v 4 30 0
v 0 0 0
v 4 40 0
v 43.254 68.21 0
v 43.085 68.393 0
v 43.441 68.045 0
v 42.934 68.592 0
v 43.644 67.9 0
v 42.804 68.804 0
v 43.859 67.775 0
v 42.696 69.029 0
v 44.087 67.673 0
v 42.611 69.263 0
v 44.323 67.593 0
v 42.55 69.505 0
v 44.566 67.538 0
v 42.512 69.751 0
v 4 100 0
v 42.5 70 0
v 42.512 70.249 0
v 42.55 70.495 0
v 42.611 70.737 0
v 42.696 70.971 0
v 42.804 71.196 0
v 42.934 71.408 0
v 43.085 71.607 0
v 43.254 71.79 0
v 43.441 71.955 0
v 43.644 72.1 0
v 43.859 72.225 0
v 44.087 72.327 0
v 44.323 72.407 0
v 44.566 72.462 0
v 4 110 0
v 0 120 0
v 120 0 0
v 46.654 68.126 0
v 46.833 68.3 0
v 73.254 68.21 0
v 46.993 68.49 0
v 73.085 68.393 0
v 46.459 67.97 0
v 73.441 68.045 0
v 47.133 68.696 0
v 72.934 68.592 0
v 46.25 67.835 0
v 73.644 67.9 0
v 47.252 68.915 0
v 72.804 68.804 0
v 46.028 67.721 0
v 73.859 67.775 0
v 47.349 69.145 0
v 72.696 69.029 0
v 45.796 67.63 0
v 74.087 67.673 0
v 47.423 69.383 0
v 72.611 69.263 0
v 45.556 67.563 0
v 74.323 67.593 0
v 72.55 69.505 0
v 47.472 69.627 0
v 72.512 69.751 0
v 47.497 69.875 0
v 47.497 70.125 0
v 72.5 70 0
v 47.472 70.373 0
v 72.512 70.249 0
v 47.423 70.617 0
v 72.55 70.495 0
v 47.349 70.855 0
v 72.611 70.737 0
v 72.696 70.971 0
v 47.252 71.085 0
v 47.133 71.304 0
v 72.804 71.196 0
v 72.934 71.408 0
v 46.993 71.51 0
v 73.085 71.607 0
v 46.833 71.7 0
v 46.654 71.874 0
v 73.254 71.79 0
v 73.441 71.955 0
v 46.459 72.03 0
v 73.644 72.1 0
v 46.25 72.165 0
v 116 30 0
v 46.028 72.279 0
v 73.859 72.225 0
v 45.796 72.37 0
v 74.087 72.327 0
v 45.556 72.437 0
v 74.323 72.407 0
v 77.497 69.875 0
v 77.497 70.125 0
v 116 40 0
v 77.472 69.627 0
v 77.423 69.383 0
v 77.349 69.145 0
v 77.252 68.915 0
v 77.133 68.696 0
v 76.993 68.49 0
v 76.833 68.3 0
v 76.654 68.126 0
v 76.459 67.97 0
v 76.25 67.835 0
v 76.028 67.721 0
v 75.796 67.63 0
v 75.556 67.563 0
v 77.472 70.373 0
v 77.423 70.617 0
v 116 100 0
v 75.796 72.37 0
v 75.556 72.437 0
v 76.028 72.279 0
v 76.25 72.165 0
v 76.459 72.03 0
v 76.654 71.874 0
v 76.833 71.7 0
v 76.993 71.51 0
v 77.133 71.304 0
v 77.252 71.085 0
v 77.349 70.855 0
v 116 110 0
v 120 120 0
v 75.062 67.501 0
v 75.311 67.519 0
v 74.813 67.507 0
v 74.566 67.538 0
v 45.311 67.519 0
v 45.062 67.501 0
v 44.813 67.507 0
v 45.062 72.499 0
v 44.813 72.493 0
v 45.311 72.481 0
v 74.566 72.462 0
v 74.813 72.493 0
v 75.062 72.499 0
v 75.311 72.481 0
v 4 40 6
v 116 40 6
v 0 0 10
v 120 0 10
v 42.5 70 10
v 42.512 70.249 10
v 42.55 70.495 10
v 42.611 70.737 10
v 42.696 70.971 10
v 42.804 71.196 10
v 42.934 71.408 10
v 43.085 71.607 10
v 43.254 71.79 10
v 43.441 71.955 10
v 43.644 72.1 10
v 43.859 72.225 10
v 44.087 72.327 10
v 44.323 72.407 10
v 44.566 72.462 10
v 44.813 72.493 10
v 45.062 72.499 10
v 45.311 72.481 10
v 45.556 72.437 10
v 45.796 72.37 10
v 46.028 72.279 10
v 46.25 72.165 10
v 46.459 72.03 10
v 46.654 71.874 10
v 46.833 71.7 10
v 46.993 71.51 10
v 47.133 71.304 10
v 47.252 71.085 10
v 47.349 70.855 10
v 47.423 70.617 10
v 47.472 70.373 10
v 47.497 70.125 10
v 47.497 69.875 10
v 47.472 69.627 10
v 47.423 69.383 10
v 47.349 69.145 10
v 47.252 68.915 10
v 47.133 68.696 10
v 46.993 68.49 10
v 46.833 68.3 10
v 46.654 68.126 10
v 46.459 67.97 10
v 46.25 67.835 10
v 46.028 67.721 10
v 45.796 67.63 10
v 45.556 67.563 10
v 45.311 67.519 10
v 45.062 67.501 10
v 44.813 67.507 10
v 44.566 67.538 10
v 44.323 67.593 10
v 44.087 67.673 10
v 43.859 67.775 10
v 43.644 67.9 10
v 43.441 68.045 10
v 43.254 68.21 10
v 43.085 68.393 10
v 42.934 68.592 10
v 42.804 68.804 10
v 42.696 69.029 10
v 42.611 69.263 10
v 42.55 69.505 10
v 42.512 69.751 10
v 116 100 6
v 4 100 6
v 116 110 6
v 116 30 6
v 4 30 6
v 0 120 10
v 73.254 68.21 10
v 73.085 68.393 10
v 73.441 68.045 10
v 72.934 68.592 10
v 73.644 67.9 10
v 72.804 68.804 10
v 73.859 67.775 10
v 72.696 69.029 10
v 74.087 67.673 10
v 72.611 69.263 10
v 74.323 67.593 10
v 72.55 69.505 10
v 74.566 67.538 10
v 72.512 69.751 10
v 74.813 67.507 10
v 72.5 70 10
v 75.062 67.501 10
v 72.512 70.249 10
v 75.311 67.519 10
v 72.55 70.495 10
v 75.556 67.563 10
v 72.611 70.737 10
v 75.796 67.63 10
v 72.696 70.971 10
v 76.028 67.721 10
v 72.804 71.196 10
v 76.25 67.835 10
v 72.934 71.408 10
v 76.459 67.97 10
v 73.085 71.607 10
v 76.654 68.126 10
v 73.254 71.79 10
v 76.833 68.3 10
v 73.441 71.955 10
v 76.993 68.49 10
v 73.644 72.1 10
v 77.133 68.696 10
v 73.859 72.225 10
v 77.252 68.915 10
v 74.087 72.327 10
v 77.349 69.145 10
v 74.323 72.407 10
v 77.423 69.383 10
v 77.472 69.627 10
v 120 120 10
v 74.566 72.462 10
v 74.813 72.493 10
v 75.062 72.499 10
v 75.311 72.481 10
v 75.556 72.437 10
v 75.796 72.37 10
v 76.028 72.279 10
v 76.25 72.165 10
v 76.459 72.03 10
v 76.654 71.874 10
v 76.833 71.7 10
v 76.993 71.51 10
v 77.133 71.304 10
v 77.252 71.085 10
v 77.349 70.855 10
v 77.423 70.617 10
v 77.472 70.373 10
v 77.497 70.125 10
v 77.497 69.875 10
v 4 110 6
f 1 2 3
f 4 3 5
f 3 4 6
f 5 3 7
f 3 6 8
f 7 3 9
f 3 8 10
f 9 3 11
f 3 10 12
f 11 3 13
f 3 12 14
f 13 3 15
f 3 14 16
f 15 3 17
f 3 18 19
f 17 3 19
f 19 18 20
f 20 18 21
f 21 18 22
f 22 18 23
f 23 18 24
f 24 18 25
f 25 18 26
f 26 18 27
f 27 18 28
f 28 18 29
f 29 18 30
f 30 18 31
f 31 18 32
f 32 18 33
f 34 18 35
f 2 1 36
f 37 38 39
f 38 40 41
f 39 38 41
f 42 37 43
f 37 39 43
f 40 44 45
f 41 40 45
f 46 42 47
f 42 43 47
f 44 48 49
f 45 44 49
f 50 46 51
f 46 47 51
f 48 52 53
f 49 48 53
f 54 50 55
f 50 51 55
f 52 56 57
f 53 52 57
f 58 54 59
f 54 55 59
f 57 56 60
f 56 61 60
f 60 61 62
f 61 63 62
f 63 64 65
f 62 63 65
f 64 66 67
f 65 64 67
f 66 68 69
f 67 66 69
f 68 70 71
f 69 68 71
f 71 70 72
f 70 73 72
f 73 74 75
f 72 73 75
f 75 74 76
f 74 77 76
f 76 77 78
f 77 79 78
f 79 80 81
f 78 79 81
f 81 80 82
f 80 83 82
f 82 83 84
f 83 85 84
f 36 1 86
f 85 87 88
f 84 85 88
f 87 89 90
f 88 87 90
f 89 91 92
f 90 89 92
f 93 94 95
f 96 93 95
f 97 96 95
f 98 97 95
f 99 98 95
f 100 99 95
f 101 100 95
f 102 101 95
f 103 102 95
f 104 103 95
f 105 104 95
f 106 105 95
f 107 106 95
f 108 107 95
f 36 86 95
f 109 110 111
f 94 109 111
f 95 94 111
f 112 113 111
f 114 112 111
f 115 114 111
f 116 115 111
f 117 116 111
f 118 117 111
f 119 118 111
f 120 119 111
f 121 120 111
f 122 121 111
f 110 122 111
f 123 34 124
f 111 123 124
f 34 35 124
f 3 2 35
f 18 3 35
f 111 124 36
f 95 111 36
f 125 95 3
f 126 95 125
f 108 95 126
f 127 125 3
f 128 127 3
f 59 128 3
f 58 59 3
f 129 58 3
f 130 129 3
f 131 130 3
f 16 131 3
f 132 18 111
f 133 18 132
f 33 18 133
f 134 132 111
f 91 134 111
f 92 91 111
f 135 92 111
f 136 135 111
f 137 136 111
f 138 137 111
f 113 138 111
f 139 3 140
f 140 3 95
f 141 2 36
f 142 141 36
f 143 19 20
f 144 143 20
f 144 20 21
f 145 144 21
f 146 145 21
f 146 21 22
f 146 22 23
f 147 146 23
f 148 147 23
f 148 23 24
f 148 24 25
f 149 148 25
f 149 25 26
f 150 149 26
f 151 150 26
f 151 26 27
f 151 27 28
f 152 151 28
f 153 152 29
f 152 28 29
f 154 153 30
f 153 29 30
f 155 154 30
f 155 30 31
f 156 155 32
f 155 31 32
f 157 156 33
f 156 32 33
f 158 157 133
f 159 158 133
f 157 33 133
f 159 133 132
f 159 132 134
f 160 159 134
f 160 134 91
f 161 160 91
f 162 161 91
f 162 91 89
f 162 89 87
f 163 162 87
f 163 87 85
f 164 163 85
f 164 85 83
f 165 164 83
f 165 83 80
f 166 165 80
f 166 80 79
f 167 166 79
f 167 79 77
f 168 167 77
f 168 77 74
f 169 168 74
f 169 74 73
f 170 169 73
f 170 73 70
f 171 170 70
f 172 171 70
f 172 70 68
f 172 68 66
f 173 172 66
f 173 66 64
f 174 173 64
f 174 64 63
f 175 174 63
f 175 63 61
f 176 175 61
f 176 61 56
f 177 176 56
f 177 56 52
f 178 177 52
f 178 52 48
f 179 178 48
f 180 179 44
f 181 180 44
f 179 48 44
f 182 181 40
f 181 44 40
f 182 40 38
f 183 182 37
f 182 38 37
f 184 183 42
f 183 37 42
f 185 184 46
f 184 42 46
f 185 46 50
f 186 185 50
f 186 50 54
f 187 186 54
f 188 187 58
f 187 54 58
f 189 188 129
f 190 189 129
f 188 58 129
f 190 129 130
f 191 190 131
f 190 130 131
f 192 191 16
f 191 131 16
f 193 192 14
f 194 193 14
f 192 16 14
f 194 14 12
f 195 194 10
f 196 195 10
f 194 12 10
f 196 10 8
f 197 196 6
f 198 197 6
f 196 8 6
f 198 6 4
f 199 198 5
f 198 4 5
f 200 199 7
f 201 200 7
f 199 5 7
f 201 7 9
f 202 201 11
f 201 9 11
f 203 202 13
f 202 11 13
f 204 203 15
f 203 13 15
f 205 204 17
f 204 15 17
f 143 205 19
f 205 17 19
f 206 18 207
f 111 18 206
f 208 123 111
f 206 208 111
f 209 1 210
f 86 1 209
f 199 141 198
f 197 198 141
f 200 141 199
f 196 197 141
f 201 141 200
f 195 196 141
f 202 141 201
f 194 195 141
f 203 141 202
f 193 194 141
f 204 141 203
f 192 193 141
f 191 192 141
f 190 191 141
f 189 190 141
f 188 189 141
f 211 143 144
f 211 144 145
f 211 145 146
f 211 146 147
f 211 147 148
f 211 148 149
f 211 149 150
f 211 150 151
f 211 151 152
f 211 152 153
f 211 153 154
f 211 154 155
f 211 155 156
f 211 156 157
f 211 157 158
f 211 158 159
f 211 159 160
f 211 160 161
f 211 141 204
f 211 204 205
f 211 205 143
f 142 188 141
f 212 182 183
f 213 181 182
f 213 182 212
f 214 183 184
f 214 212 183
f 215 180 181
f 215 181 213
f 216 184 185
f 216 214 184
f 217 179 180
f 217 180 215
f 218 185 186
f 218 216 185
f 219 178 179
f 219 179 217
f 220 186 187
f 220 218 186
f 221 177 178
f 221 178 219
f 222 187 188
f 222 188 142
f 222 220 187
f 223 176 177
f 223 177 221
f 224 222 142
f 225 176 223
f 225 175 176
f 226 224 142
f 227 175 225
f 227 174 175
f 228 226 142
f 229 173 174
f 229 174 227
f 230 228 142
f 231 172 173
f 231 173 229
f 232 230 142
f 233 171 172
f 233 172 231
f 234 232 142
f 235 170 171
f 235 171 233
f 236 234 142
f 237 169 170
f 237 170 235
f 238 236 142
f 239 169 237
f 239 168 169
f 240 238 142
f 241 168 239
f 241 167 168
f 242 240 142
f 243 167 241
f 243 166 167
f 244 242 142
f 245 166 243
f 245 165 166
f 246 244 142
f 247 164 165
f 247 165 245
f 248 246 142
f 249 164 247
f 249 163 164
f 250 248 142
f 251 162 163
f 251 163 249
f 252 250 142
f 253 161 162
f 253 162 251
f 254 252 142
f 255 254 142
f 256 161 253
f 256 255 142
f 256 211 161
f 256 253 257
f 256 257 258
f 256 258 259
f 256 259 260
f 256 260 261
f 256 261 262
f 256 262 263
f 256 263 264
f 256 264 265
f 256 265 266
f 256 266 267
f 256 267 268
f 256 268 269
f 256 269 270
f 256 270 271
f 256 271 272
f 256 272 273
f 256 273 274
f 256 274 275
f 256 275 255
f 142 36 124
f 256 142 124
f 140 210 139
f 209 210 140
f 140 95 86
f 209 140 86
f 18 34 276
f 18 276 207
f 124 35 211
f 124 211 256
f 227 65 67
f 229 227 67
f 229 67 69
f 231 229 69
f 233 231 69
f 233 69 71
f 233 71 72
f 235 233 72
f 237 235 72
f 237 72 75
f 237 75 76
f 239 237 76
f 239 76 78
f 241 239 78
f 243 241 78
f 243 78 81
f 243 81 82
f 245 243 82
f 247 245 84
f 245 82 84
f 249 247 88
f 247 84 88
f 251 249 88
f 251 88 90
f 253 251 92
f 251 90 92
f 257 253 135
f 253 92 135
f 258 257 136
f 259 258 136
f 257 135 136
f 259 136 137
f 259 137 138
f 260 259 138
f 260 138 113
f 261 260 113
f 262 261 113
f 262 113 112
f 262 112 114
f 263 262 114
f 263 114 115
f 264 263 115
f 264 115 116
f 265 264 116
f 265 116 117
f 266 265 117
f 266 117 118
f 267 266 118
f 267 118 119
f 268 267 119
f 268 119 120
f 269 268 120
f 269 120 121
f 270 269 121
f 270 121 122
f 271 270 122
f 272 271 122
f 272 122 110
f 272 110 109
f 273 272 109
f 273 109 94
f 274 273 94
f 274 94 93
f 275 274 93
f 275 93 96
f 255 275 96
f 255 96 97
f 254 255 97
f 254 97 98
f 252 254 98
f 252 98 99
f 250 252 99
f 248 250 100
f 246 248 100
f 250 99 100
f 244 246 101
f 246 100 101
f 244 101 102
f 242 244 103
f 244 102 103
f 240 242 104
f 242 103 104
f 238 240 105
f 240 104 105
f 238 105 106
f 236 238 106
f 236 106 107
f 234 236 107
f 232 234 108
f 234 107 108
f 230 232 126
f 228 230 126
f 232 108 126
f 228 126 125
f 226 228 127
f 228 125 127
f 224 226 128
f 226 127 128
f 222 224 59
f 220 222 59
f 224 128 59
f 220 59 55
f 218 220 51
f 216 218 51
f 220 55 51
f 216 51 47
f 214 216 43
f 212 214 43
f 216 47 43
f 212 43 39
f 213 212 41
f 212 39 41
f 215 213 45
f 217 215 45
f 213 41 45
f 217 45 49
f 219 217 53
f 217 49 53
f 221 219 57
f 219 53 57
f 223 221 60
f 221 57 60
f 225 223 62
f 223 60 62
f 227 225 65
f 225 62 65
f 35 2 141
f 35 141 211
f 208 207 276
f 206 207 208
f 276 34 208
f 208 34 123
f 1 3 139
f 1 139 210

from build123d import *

# Parameters (mm, degrees)
F0_W     = 120
F0_H     = 120
F1_DEPTH = 10
F2_W     = 112
F2_H     = 10
F3_DEPTH = 6
F5_D     = 5


with BuildPart() as f1:
    # F0 (on Top) → F1 (new body)
    with BuildSketch(Plane.XY):
        with Locations((60, 60)):
            Rectangle(F0_W, F0_H)
    extrude(amount=F1_DEPTH)

    # F2 (on face) → F3 (cut)
    with BuildSketch(Plane(origin=(0, 0, 0), x_dir=(1, 0, 0), z_dir=(0, 0, -1))):
        with Locations((60, -105)):
            Rectangle(F2_W, F2_H)
        with Locations((60, -35)):
            Rectangle(F2_W, F2_H)
    extrude(amount=-F3_DEPTH, mode=Mode.SUBTRACT)

    # F5 (through all)
    with Locations(Plane.XY.offset(10)):
        with Locations((45, 70), (75, 70)):
            Hole(F5_D / 2)


solid = f1.part
